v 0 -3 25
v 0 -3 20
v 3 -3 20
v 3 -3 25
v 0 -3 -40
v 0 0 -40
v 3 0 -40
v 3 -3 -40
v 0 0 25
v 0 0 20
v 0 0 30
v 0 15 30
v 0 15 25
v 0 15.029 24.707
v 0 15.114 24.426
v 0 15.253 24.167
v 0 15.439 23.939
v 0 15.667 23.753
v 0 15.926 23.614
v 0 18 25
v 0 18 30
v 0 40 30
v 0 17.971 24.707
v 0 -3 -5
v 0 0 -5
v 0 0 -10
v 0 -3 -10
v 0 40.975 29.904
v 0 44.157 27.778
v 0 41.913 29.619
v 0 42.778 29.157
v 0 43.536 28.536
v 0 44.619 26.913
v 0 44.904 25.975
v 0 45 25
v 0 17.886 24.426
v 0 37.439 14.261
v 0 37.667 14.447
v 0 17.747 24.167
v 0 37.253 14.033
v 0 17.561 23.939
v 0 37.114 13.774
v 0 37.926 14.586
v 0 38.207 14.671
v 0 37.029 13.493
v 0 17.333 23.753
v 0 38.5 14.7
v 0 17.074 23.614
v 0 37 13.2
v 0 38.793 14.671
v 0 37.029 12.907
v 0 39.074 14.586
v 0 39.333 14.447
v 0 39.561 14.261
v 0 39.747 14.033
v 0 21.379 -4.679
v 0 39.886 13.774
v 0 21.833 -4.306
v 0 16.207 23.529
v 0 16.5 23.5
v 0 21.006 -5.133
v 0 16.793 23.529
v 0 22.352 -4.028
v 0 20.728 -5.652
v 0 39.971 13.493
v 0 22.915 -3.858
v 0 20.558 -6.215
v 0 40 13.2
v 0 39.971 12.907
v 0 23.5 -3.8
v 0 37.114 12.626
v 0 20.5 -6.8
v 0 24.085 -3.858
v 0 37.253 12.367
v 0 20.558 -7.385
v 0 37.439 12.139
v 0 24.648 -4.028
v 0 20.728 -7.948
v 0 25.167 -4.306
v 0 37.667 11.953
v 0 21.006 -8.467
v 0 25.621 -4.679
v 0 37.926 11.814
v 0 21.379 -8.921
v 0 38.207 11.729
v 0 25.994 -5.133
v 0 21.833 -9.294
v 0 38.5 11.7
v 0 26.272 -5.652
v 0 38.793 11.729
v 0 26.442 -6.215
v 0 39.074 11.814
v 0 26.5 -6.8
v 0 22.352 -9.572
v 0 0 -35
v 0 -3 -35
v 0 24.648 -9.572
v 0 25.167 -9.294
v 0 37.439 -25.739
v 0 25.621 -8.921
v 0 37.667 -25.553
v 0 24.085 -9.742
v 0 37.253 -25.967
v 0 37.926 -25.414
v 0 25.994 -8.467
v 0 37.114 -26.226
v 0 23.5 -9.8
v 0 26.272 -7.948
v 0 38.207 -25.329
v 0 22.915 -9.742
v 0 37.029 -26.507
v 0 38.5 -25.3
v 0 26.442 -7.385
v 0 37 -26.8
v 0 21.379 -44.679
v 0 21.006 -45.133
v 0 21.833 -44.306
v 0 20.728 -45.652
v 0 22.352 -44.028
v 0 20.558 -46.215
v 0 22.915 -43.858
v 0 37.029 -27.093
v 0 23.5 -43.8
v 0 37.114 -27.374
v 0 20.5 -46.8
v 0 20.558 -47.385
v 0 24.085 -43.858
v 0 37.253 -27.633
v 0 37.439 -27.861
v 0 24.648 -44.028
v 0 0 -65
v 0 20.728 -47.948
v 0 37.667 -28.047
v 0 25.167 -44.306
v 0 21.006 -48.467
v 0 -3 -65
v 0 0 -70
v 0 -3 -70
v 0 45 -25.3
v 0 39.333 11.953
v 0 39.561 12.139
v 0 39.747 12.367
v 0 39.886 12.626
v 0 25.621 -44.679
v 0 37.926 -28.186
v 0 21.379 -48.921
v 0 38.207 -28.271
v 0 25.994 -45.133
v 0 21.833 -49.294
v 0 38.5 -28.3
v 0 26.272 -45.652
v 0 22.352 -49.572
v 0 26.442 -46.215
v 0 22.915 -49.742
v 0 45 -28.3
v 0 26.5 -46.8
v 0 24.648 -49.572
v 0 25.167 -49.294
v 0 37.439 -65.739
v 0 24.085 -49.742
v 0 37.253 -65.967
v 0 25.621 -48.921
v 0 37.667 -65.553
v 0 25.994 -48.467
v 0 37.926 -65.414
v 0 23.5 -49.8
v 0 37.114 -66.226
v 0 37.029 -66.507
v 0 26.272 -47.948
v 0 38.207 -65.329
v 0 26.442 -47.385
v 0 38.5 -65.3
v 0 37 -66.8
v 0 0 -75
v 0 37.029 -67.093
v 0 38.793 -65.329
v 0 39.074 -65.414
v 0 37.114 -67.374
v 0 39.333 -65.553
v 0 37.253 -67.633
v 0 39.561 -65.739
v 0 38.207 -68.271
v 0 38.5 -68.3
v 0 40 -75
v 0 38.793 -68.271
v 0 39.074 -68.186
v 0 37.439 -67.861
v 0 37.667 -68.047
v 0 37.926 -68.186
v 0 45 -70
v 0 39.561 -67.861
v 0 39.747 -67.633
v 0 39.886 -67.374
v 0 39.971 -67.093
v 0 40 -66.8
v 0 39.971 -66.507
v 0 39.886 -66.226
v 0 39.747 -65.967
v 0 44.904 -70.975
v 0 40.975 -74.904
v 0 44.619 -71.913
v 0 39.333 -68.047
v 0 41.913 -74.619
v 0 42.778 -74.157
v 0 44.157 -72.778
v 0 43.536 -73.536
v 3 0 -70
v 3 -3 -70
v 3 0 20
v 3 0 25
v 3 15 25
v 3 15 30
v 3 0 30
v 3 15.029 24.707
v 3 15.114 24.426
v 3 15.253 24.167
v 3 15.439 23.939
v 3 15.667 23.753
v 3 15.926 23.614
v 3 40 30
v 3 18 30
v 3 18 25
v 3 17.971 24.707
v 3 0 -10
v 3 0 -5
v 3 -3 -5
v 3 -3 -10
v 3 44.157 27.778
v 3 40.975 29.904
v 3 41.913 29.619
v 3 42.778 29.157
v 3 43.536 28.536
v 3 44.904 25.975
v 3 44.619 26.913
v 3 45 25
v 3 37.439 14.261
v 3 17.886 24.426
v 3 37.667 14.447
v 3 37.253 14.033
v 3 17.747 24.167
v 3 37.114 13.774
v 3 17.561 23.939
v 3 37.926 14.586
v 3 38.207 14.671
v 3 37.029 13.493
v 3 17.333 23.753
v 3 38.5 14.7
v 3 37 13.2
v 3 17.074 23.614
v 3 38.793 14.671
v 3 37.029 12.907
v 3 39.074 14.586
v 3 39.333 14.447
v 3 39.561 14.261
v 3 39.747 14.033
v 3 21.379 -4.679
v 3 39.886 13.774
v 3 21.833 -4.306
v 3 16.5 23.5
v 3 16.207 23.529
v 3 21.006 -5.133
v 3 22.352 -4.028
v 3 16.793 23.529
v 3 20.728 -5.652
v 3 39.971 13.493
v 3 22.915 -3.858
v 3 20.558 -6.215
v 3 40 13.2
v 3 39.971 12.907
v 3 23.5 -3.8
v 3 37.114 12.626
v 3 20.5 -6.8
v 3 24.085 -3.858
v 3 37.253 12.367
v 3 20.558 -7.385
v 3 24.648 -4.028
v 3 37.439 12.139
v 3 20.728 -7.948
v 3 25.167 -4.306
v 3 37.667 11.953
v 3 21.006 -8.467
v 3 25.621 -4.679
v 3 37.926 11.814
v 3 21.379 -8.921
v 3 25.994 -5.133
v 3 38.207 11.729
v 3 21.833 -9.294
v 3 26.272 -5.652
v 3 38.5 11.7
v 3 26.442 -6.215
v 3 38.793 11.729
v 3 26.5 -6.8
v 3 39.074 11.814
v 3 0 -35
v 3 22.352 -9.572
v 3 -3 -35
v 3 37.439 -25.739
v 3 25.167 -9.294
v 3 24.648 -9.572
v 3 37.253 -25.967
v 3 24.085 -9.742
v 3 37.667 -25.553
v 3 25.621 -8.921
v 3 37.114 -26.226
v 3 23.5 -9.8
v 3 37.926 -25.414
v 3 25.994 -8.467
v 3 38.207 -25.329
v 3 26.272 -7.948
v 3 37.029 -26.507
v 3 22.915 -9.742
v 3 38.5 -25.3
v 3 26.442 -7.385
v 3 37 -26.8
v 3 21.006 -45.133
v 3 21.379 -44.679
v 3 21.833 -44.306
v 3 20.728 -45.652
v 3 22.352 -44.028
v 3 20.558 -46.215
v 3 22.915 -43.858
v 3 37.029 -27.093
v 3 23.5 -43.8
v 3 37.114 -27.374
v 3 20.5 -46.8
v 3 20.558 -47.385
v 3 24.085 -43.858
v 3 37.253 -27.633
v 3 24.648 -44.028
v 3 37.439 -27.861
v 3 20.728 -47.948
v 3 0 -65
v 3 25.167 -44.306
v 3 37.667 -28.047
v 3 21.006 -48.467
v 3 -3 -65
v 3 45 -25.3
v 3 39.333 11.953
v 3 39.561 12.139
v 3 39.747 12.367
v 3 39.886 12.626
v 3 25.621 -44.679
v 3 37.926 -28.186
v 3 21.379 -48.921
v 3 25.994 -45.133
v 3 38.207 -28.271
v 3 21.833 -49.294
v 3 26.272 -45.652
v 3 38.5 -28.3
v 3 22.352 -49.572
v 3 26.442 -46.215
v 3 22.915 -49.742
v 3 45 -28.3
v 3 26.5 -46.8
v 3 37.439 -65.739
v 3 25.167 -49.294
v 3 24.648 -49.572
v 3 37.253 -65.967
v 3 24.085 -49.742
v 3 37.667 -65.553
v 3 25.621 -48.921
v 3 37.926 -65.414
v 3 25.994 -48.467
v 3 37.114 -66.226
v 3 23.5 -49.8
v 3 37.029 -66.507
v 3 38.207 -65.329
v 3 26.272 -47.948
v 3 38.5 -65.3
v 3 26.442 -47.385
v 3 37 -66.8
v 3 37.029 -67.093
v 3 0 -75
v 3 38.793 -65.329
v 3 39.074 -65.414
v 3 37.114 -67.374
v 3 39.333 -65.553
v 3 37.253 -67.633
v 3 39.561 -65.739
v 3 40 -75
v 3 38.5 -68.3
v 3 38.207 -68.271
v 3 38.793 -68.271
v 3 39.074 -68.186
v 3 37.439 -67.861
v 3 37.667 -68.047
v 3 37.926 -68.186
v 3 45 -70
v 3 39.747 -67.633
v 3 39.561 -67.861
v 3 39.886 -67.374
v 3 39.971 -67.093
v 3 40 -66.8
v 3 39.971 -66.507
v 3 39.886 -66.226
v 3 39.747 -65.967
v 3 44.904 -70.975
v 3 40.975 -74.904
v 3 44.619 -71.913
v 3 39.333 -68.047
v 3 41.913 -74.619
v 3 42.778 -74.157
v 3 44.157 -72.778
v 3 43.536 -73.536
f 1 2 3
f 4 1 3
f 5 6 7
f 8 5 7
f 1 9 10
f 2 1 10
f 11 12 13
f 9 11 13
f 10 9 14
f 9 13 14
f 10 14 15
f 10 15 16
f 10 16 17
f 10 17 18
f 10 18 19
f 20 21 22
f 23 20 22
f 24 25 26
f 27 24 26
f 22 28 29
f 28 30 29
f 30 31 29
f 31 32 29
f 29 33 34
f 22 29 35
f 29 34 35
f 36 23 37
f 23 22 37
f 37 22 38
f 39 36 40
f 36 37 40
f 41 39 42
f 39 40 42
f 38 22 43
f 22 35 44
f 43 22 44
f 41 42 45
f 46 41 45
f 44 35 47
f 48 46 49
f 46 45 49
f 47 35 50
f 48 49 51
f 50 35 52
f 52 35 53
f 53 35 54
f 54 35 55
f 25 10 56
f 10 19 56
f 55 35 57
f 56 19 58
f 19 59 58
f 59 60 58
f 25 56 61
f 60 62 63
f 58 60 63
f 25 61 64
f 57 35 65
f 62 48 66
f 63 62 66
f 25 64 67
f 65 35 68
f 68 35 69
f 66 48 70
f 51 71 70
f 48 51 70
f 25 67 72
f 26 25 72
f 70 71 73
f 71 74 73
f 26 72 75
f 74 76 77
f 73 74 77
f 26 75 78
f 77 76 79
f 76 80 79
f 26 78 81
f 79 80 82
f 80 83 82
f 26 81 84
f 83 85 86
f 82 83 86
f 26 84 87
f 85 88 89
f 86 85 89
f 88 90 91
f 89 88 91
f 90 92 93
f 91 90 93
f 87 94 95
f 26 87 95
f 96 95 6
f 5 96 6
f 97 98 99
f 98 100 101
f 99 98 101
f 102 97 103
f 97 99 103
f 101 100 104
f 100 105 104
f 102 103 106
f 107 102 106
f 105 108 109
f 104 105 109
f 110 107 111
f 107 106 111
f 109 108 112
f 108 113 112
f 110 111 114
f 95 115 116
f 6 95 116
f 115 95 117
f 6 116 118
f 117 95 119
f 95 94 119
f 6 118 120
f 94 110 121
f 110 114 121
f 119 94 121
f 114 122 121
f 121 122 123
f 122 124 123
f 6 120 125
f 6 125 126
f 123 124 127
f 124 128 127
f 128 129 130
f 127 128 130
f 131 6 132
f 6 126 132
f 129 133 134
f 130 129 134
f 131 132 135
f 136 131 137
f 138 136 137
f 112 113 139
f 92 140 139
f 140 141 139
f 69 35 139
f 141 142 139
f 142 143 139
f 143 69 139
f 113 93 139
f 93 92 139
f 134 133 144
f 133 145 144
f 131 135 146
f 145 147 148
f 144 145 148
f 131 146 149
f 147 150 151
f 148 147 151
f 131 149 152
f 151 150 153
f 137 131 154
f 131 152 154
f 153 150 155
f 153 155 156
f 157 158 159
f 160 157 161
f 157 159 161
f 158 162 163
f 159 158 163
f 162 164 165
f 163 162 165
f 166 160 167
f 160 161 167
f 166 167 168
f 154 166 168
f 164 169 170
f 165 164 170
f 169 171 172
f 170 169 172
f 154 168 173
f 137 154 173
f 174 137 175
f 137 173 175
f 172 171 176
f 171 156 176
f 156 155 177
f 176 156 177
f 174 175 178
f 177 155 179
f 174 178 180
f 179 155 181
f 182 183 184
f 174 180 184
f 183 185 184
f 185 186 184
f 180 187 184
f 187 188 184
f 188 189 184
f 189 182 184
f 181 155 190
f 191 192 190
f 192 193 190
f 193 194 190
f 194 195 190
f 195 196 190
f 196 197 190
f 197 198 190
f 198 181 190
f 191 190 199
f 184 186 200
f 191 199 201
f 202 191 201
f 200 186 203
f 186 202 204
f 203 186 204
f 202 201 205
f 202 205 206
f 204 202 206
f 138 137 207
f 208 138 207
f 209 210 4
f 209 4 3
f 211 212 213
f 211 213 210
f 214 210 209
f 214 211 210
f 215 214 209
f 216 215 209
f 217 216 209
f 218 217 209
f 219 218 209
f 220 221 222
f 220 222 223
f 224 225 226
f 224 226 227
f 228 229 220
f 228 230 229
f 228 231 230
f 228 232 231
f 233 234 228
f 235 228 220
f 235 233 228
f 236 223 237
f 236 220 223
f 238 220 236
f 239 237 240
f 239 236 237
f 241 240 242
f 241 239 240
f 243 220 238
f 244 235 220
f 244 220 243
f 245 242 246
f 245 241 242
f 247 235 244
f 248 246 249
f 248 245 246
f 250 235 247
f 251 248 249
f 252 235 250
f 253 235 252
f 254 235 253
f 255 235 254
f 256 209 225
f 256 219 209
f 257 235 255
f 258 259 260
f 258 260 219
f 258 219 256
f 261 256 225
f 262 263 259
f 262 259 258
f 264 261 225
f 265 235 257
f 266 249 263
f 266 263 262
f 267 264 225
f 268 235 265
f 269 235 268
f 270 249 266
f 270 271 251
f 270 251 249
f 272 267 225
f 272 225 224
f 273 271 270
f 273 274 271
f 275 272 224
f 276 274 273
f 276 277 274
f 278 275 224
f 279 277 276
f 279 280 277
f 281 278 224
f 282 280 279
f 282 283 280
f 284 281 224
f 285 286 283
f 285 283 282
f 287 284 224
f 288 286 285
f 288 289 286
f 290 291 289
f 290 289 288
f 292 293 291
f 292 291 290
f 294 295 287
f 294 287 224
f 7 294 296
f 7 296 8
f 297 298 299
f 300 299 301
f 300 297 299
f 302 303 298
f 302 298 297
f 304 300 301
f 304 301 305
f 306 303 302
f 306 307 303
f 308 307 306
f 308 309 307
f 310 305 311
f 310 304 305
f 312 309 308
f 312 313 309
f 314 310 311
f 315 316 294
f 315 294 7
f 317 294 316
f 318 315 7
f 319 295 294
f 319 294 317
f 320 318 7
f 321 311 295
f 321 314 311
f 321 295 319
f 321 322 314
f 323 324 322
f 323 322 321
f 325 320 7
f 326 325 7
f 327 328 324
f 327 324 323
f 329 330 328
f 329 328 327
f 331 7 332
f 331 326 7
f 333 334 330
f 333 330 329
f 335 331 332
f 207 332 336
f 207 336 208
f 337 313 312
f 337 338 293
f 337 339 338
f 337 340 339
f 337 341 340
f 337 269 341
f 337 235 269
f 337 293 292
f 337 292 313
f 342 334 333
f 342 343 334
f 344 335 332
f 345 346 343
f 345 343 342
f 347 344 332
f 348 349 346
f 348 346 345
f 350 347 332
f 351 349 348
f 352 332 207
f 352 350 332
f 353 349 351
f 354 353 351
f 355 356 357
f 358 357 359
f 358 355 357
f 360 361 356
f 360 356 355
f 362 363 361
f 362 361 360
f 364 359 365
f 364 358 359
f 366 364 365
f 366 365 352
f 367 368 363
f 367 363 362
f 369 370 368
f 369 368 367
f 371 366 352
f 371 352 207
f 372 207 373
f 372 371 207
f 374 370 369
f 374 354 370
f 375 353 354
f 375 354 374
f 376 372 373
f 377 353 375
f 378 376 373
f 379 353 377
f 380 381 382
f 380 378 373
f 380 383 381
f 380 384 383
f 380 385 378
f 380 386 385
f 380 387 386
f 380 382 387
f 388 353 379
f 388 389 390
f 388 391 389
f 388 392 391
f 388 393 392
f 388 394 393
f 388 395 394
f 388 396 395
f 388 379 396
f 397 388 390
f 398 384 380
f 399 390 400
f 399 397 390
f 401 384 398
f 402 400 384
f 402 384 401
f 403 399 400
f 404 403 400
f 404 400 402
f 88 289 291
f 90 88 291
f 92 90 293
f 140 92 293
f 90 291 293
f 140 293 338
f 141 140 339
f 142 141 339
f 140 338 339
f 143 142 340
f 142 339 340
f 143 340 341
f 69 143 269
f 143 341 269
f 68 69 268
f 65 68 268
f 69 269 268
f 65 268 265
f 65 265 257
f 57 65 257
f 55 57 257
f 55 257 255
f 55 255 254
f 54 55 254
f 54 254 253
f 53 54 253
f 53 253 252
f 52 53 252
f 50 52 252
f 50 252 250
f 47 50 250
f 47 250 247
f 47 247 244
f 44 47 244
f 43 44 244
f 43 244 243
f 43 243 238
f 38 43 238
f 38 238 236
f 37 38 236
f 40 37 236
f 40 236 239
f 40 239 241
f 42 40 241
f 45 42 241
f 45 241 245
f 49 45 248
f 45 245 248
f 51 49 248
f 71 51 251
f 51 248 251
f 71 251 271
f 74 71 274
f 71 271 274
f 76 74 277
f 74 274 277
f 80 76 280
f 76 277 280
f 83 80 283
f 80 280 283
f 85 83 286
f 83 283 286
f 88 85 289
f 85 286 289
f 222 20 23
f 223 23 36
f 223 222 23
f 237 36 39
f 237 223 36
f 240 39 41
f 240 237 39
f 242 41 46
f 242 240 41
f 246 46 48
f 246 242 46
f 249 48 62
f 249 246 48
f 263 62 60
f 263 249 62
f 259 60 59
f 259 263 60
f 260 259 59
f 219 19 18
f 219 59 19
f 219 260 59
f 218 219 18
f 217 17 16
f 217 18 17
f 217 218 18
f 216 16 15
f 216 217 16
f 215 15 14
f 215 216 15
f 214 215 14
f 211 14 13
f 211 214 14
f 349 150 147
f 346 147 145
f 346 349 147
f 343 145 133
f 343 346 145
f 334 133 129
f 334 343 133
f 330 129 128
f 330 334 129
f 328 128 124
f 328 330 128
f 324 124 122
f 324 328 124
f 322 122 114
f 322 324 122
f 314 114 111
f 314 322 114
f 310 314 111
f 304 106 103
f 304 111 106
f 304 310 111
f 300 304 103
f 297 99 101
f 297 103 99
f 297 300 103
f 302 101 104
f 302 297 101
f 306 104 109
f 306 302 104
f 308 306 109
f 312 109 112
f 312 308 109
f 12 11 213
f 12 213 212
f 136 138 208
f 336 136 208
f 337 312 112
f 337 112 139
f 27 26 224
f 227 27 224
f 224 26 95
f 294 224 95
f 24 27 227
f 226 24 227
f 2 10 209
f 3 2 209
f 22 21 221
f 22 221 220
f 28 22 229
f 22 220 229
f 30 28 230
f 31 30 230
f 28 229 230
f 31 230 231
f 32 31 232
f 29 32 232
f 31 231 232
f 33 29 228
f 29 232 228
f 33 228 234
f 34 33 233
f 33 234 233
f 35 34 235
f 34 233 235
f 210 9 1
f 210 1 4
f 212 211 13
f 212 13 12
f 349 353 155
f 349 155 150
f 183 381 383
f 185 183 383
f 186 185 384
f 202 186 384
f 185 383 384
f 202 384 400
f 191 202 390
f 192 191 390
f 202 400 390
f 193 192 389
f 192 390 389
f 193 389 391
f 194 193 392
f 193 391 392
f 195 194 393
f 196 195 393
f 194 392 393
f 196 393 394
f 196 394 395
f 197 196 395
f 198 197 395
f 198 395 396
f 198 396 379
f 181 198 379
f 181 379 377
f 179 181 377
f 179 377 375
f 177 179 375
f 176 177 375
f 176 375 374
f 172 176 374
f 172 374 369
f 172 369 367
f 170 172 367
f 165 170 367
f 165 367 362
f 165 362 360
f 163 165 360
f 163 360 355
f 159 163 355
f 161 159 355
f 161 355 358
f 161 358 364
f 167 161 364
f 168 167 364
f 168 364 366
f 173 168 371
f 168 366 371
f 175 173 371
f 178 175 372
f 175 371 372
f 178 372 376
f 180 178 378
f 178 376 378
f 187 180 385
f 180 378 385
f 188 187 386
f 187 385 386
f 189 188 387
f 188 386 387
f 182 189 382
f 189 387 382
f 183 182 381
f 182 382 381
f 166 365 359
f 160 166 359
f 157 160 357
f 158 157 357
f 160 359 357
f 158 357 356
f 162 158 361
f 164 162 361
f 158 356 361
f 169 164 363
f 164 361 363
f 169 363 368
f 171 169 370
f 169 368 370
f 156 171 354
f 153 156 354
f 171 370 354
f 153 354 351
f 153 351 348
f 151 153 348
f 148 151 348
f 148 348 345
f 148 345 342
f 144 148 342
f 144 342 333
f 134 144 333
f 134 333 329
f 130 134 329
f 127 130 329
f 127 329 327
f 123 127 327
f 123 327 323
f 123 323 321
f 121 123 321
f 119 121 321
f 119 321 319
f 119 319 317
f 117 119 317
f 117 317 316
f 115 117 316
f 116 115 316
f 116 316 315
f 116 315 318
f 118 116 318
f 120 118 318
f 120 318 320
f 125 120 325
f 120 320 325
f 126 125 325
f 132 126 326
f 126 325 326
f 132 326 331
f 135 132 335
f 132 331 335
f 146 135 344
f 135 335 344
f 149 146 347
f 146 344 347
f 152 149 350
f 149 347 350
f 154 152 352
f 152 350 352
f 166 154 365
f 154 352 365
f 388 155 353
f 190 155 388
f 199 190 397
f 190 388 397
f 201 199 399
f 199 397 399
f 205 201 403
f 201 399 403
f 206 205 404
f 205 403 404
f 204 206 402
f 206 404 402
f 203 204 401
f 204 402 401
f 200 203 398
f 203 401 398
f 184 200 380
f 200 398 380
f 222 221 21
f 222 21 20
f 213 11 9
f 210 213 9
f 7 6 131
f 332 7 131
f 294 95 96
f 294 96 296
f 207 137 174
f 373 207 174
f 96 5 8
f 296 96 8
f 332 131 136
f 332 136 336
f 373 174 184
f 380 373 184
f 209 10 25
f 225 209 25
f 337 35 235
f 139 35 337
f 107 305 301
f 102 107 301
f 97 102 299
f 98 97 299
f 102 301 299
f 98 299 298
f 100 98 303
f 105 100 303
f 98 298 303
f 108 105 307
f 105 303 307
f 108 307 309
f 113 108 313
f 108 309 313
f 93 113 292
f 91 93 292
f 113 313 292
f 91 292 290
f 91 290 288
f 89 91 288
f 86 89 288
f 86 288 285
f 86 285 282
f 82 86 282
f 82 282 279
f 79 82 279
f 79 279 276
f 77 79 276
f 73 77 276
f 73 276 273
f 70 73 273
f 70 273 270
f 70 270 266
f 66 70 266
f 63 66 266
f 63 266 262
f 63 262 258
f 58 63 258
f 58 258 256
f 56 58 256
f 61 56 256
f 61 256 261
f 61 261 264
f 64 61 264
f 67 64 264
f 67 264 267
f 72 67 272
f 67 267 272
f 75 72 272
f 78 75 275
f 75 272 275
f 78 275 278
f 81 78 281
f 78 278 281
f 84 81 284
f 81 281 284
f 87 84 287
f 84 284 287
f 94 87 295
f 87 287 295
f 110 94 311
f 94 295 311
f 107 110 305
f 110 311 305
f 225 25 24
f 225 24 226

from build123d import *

# Parameters (mm, degrees)
SKETCH1_W           = 105
SKETCH1_H           = 45
BOSS_EXTRUDE1_DEPTH = 3
SKETCH2_R           = 3
SKETCH2_R_2         = 1.5
CUT_EXTRUDE1_DEPTH  = 4
CUT_EXTRUDE2_DEPTH  = 4
FILLET3_R           = 5
SKETCH4_W           = 3
SKETCH4_H           = 5
BOSS_EXTRUDE2_DEPTH = 3
LPATTERN1_COUNT     = 4
LPATTERN1_PITCH     = 30


with BuildPart() as part:
    # Sketch1 → Boss-Extrude1 (new body)
    with BuildSketch(Plane(origin=(0, 0, 0), x_dir=(0, 0, -1), z_dir=(1, 0, 0))):
        with Locations((22.5, 22.5)):
            Rectangle(SKETCH1_W, SKETCH1_H)
    extrude(amount=BOSS_EXTRUDE1_DEPTH)

    # Sketch2 → Cut-Extrude1 (cut, through all)
    with BuildSketch(Plane(origin=(3, 0, 0), x_dir=(0, 0, -1), z_dir=(1, 0, 0))):
        with Locations((6.8, 23.5)):
            Circle(SKETCH2_R)
        with Locations((46.8, 23.5)):
            Circle(SKETCH2_R)
        with Locations((66.8, 38.5)):
            Circle(SKETCH2_R_2)
        with Locations((-13.2, 38.5)):
            Circle(SKETCH2_R_2)
        with BuildLine():
            Line((25.3, 38.5), (25.3, 45))
            Line((25.3, 45), (28.3, 45))
            Line((28.3, 45), (28.3, 38.5))
            ThreePointArc((28.3, 38.5), (26.8, 37), (25.3, 38.5))
        make_face()
    extrude(amount=-CUT_EXTRUDE1_DEPTH, mode=Mode.SUBTRACT)

    # Sketch3 → Cut-Extrude2 (cut, through all)
    with BuildSketch(Plane(origin=(3, 0, 0), x_dir=(0, 0, -1), z_dir=(1, 0, 0))):
        with BuildLine():
            Line((-25, 15), (-30, 15))
            Line((-30, 15), (-30, 18))
            Line((-30, 18), (-25, 18))
            ThreePointArc((-25, 18), (-23.5, 16.5), (-25, 15))
        make_face()
    extrude(amount=-CUT_EXTRUDE2_DEPTH, mode=Mode.SUBTRACT)

    # Fillet3
    fillet3_edges = [part.edges().sort_by_distance(p)[0] for p in [
        (1.5, 45, 30),
        (1.5, 45, -75),
    ]]
    fillet(fillet3_edges, radius=FILLET3_R)

    # Sketch4 → Boss-Extrude2 (add)
    with BuildSketch(Plane(origin=(0, 0, 0), x_dir=(1, 0, 0), z_dir=(0, 1, 0))):
        with Locations((1.5, -22.5)):
            Rectangle(SKETCH4_W, SKETCH4_H)
    boss_extrude2 = extrude(amount=-BOSS_EXTRUDE2_DEPTH)

    # LPattern1: Boss-Extrude2 ×4
    with Locations(*[(0, 0, -i * LPATTERN1_PITCH) for i in range(1, LPATTERN1_COUNT)]):
        add(boss_extrude2)


solid = part.part
